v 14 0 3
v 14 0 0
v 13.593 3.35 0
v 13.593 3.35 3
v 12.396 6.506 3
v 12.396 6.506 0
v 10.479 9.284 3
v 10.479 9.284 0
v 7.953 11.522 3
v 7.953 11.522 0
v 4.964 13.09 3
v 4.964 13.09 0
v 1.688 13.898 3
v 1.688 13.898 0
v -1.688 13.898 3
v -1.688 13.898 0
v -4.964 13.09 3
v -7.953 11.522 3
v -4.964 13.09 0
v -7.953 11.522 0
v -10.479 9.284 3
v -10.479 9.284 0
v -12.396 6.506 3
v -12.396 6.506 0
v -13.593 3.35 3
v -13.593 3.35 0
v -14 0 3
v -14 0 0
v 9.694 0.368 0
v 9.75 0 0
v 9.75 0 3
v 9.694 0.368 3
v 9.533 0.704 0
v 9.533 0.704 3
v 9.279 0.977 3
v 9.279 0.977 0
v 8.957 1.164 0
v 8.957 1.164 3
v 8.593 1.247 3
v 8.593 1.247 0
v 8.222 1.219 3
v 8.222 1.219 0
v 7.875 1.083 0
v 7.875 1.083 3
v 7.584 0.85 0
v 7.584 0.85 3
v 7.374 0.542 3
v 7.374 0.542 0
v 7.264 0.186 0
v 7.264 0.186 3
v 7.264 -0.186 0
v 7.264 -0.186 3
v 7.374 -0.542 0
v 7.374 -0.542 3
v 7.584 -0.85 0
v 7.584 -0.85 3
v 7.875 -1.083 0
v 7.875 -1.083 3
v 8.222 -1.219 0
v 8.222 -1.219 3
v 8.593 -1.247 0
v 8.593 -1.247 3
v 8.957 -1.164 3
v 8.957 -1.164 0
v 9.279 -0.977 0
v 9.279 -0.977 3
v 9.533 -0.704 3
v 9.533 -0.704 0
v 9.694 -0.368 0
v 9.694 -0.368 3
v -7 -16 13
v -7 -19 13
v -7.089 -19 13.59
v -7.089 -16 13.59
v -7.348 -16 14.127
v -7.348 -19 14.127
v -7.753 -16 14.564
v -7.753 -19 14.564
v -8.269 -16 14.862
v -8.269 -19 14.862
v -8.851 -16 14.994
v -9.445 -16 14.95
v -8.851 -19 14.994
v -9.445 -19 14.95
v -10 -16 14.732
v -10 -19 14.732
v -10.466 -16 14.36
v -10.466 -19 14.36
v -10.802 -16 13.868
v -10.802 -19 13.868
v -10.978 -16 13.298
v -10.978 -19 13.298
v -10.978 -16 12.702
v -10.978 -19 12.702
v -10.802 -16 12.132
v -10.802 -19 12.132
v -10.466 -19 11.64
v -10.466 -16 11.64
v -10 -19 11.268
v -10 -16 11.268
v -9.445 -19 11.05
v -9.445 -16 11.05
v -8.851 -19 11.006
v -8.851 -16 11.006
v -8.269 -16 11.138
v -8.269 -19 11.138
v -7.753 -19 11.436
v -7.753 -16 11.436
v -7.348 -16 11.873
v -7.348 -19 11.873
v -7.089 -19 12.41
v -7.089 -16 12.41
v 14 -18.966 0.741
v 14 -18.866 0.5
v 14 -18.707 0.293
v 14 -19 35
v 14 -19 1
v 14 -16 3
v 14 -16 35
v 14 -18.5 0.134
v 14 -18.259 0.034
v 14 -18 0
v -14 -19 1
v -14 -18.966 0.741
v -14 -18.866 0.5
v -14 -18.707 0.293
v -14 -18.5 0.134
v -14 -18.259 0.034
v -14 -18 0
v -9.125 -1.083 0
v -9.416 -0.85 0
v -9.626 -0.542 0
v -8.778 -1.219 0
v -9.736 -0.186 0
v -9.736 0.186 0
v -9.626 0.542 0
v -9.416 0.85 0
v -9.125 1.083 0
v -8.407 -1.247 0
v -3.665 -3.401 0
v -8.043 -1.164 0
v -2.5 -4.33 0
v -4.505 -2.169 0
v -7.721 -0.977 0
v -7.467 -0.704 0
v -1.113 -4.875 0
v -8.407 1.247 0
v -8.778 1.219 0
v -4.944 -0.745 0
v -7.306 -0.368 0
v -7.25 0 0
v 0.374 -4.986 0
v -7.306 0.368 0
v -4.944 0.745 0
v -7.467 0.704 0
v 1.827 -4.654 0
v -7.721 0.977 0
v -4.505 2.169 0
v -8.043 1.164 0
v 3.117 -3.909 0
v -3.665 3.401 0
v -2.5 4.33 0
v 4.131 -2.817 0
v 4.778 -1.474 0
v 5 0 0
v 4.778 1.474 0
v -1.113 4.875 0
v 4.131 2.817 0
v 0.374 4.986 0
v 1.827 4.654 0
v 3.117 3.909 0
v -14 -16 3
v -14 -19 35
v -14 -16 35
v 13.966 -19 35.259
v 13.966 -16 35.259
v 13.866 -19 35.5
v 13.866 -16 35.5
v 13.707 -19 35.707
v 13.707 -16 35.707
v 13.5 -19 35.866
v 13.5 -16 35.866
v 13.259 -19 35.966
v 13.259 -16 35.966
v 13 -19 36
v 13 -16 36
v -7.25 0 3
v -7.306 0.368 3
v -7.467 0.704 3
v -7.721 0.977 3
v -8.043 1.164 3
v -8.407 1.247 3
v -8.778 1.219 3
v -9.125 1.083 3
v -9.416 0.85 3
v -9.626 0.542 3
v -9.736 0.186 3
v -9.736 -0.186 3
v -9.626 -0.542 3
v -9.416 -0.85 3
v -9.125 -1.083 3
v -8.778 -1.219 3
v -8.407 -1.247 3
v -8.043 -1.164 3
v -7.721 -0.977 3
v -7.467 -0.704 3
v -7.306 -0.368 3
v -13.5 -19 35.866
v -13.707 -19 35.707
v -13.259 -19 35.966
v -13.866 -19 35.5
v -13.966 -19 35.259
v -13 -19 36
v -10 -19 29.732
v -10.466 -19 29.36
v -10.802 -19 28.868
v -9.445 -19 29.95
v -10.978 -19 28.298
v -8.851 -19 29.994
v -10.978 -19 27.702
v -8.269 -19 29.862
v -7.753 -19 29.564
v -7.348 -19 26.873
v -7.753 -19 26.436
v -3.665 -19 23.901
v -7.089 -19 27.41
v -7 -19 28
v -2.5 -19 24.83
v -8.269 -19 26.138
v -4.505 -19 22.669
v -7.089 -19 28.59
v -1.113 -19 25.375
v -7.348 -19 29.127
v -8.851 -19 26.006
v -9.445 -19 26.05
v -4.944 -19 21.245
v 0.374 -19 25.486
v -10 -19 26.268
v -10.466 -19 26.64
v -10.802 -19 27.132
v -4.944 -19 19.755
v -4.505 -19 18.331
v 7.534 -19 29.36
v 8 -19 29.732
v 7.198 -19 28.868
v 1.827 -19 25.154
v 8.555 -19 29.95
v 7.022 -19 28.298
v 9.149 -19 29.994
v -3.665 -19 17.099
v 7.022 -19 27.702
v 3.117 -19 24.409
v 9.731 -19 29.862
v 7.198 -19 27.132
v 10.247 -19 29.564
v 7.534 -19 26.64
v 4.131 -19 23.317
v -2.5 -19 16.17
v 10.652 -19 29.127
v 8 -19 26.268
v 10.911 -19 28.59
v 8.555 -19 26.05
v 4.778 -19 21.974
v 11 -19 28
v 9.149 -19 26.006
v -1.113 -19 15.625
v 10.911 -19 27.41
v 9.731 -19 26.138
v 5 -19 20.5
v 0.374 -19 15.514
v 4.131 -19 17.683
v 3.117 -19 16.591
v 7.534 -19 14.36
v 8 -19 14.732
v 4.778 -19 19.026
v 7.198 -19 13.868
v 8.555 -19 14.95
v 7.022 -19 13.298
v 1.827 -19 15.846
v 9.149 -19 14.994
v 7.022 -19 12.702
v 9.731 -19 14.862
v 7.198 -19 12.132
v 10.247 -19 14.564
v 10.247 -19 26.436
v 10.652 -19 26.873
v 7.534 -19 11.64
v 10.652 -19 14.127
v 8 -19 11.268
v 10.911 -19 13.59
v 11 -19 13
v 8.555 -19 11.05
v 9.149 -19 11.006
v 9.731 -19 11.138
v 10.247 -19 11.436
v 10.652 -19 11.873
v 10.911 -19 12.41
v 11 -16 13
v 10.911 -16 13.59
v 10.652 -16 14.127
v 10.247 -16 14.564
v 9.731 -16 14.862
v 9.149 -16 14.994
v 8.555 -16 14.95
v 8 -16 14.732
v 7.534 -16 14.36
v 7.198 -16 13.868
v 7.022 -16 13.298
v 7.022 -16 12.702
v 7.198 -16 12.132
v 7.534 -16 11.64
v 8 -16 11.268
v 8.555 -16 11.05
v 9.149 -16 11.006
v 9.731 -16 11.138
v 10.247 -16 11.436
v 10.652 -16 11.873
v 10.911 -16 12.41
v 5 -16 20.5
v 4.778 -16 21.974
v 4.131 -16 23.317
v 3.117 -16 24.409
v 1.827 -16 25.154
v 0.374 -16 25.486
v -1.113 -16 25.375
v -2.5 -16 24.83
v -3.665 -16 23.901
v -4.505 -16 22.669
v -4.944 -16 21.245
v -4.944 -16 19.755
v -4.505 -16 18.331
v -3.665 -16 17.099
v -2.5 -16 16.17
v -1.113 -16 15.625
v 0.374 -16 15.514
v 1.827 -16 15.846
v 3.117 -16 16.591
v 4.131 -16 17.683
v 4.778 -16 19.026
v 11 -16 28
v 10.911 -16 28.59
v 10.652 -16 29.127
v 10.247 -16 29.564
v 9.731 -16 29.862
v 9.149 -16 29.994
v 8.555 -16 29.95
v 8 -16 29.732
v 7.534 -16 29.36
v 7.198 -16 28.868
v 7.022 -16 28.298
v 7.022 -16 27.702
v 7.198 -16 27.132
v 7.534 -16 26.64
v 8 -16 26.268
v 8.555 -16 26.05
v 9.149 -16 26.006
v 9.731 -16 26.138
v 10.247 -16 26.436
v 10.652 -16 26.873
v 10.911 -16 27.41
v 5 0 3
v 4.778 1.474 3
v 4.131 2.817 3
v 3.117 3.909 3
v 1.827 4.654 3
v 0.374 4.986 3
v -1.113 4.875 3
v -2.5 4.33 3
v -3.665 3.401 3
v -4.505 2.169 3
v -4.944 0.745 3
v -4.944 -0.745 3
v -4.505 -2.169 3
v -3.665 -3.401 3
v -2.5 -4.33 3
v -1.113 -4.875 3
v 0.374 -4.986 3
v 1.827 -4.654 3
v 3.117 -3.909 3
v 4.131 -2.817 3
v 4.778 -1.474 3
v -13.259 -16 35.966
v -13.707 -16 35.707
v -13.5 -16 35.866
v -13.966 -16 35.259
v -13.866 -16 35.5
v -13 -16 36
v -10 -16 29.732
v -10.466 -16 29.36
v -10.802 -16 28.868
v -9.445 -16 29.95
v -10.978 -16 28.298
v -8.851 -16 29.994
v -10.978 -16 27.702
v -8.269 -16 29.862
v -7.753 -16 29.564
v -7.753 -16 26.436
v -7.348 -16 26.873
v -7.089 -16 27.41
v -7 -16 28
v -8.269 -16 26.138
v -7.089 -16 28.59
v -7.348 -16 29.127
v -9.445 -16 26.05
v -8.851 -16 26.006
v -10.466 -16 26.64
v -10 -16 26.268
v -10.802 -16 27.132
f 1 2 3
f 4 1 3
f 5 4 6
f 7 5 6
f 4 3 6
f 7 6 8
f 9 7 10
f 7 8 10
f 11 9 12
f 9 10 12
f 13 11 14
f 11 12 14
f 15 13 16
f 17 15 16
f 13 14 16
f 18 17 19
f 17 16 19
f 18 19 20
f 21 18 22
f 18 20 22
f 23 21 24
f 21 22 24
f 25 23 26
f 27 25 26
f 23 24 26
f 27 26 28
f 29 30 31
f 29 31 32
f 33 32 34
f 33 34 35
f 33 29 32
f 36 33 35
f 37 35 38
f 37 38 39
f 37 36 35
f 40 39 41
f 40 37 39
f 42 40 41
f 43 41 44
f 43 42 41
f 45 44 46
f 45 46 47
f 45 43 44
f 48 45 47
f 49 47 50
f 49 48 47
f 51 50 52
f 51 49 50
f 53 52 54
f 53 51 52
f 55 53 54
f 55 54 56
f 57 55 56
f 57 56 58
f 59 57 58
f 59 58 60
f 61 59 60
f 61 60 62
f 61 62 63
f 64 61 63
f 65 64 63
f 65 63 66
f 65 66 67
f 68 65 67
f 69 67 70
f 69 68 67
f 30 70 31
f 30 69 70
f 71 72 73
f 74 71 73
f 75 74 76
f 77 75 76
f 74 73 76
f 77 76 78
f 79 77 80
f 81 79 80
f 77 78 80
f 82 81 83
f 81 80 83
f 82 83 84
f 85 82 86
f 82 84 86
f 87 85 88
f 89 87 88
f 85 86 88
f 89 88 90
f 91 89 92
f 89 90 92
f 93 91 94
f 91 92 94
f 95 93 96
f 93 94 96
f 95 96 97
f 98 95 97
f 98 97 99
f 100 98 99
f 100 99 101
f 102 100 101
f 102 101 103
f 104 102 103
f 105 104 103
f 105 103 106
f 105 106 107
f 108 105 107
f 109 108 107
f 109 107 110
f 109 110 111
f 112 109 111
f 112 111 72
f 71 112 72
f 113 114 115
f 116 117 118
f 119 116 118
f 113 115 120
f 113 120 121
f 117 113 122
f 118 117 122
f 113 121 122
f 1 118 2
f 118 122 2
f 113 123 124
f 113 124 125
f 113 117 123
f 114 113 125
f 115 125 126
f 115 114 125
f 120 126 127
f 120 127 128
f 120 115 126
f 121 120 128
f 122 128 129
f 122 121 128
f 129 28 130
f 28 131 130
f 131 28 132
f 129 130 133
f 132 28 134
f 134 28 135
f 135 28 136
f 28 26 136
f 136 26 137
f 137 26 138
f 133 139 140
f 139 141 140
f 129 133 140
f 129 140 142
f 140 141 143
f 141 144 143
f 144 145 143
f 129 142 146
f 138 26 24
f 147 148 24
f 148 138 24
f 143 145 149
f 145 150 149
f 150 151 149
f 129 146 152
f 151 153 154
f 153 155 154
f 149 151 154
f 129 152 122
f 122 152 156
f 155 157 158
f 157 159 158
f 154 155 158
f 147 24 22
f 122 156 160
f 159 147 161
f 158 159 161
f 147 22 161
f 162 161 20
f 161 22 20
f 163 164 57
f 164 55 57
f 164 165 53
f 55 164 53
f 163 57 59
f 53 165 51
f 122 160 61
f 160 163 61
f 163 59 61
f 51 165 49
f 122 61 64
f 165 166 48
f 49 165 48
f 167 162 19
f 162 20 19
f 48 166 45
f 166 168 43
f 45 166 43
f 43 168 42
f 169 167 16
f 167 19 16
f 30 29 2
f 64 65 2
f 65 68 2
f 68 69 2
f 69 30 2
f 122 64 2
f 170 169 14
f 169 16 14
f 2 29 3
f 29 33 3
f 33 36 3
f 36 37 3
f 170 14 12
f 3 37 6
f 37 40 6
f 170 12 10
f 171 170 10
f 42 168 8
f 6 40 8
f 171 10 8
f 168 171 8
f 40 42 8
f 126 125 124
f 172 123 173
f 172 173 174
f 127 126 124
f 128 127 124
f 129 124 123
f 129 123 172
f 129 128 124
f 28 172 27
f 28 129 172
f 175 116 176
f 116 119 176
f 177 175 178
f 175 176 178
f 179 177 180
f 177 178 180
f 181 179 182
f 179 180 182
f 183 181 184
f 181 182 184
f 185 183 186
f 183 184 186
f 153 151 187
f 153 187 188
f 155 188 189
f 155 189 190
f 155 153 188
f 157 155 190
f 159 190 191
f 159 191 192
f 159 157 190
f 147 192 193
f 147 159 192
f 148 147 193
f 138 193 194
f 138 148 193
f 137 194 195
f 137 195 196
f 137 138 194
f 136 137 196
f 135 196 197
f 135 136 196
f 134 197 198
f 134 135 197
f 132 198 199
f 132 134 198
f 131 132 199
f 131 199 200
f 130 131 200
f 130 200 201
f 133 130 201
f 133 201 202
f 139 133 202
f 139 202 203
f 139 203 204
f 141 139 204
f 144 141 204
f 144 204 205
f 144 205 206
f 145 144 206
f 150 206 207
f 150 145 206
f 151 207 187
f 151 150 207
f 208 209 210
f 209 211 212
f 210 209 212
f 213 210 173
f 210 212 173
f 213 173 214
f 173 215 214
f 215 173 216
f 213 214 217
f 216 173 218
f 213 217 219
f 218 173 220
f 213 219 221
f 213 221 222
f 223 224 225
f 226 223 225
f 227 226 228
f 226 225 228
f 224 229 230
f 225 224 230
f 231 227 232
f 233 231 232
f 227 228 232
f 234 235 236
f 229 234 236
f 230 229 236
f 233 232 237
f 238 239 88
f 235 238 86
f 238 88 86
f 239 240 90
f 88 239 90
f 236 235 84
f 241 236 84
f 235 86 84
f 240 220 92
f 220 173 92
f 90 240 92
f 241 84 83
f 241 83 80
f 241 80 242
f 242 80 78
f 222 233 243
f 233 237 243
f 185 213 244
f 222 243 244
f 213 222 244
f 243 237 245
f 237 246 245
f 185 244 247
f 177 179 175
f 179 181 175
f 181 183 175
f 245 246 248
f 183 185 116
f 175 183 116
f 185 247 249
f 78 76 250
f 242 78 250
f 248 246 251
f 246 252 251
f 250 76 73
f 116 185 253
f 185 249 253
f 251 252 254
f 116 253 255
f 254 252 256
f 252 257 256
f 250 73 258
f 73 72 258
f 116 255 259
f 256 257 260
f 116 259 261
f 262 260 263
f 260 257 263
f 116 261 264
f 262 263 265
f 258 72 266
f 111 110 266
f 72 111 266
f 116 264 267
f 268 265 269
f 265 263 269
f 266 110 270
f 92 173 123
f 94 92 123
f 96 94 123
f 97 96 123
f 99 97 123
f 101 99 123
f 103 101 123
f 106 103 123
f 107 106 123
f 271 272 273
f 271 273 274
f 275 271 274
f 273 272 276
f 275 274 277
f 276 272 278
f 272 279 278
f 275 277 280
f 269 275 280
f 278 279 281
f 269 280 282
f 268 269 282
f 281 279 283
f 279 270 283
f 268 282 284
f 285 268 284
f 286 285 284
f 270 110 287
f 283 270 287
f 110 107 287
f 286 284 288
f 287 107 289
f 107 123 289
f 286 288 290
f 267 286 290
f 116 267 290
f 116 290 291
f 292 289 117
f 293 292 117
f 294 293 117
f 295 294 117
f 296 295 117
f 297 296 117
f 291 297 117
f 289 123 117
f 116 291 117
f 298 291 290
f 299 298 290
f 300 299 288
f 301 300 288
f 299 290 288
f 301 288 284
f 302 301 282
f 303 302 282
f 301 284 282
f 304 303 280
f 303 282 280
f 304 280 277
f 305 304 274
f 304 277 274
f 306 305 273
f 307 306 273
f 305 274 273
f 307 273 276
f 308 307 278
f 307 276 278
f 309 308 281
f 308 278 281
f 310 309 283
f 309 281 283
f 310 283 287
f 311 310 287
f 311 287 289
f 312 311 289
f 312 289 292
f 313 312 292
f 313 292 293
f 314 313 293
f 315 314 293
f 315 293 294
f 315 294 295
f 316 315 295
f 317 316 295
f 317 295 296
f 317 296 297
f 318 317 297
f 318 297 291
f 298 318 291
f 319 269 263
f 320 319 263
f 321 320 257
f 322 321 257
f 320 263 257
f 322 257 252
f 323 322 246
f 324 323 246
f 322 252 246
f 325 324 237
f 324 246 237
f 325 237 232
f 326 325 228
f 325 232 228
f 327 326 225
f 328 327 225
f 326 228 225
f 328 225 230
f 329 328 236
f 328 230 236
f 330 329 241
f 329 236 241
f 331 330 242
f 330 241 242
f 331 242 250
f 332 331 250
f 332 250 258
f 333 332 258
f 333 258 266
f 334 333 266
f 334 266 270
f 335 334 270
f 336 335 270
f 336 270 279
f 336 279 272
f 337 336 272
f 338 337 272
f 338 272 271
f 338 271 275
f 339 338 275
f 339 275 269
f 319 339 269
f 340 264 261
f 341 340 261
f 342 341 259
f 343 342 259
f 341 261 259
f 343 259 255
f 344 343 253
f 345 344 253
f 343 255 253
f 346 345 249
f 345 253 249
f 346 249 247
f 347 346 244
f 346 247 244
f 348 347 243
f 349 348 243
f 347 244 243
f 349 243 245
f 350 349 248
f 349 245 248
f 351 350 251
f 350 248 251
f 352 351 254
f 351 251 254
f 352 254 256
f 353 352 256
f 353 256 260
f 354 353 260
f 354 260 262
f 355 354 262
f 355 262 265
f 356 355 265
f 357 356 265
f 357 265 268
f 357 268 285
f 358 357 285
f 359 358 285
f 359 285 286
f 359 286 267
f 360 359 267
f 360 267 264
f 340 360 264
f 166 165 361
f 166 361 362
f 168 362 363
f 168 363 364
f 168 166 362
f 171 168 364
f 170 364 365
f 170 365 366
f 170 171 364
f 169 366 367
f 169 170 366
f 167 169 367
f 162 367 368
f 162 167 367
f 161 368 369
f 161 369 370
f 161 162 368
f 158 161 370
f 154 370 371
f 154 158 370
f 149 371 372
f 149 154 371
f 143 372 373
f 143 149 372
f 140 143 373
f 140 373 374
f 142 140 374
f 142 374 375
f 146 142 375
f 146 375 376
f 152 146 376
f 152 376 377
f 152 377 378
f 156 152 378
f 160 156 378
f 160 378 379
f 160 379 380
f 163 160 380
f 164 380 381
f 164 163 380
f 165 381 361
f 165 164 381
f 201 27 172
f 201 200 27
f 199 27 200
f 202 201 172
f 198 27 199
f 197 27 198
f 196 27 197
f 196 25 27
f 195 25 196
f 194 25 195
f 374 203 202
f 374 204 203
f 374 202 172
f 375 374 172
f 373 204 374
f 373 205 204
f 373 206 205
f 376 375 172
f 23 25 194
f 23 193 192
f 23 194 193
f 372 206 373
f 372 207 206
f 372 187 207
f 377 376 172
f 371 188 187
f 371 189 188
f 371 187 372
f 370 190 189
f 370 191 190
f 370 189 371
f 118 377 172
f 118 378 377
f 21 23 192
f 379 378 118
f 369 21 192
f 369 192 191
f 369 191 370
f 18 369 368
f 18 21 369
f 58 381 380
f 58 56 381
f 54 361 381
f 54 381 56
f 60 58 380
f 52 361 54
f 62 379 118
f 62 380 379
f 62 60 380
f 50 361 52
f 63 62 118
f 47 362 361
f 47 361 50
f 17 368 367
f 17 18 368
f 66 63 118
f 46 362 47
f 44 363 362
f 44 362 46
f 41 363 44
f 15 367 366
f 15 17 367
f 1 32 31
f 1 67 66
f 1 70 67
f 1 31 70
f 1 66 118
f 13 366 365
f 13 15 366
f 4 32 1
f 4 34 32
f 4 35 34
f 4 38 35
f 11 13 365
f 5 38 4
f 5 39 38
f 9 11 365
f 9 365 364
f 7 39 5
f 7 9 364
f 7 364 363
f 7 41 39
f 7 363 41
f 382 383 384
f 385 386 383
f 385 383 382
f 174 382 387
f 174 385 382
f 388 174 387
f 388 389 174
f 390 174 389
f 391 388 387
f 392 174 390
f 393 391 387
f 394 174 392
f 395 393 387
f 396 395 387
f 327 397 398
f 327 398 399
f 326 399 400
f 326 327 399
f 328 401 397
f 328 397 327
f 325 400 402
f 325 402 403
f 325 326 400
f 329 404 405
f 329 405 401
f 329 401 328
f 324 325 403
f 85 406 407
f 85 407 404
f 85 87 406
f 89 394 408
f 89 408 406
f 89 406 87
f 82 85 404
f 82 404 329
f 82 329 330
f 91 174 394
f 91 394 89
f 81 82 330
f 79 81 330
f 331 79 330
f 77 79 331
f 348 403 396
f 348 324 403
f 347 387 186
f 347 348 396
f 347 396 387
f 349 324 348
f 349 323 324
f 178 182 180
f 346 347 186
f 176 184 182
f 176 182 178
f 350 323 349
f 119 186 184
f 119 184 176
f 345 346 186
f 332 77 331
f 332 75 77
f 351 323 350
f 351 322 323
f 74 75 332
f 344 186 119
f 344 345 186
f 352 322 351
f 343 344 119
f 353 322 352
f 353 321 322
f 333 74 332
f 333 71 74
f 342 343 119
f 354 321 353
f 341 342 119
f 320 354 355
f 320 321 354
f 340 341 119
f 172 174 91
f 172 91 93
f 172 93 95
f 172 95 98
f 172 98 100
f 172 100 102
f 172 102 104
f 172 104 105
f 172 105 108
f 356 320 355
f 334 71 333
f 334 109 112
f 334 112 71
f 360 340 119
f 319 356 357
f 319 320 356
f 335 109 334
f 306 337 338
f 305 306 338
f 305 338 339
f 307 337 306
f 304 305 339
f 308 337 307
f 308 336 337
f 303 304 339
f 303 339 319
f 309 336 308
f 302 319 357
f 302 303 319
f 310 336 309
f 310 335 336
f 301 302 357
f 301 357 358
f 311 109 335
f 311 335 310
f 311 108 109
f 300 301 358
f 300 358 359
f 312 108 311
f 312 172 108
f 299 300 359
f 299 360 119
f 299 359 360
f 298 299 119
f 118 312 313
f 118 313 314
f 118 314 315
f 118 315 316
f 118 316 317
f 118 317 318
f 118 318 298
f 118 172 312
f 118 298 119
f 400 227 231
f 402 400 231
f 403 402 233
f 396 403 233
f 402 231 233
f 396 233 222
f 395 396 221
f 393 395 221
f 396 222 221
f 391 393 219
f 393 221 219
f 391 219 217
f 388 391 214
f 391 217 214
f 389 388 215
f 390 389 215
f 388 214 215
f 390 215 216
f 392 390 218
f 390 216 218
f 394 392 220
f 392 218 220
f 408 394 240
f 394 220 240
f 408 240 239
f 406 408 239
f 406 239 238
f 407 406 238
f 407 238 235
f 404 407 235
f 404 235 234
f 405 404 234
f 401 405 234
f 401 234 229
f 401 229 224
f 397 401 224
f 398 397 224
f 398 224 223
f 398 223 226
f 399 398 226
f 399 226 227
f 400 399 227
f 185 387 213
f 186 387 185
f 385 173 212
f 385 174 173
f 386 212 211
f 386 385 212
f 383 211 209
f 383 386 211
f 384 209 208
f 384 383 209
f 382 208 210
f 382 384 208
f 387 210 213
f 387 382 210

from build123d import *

# Parameters (mm, degrees)
SKETCH1_R           = 5
SKETCH1_R_2         = 1.25
BOSS_EXTRUDE1_DEPTH = 3
SKETCH2_W           = 28
SKETCH2_H           = 3
BOSS_EXTRUDE2_DEPTH = 33
FILLET1_R           = 1
SKETCH4_R           = 2
SKETCH4_R_2         = 5
CUT_EXTRUDE1_DEPTH  = 10


with BuildPart() as part:
    # Sketch1 → Boss-Extrude1 (new body)
    with BuildSketch(Plane.XY):
        with BuildLine():
            Line((-14, 0), (-14, -19))
            Line((-14, -19), (14, -19))
            Line((14, -19), (14, 0))
            ThreePointArc((14, 0), (0, 14), (-14, 0))
        make_face()
        Circle(SKETCH1_R, mode=Mode.SUBTRACT)
        with Locations((-8.5, 0)):
            Circle(SKETCH1_R_2, mode=Mode.SUBTRACT)
        with Locations((8.5, 0)):
            Circle(SKETCH1_R_2, mode=Mode.SUBTRACT)
    extrude(amount=BOSS_EXTRUDE1_DEPTH)

    # Sketch2 → Boss-Extrude2 (add)
    with BuildSketch(Plane.XY.offset(3)):
        with Locations((0, -17.5)):
            Rectangle(SKETCH2_W, SKETCH2_H)
    extrude(amount=BOSS_EXTRUDE2_DEPTH)

    # Fillet1
    fillet1_edges = [part.edges().sort_by_distance(p)[0] for p in [
        (-14, -17.5, 36),
        (14, -17.5, 36),
        (0, -19, 0),
    ]]
    fillet(fillet1_edges, radius=FILLET1_R)

    # Sketch4 → Cut-Extrude1 (cut)
    with BuildSketch(Plane.XZ.offset(19)):
        with Locations((-9, 28)):
            Circle(SKETCH4_R)
        with Locations((-9, 13)):
            Circle(SKETCH4_R)
        with Locations((9, 28)):
            Circle(SKETCH4_R)
        with Locations((9, 13)):
            Circle(SKETCH4_R)
        with Locations((0, 20.5)):
            Circle(SKETCH4_R_2)
    extrude(amount=-CUT_EXTRUDE1_DEPTH, mode=Mode.SUBTRACT)


solid = part.part
